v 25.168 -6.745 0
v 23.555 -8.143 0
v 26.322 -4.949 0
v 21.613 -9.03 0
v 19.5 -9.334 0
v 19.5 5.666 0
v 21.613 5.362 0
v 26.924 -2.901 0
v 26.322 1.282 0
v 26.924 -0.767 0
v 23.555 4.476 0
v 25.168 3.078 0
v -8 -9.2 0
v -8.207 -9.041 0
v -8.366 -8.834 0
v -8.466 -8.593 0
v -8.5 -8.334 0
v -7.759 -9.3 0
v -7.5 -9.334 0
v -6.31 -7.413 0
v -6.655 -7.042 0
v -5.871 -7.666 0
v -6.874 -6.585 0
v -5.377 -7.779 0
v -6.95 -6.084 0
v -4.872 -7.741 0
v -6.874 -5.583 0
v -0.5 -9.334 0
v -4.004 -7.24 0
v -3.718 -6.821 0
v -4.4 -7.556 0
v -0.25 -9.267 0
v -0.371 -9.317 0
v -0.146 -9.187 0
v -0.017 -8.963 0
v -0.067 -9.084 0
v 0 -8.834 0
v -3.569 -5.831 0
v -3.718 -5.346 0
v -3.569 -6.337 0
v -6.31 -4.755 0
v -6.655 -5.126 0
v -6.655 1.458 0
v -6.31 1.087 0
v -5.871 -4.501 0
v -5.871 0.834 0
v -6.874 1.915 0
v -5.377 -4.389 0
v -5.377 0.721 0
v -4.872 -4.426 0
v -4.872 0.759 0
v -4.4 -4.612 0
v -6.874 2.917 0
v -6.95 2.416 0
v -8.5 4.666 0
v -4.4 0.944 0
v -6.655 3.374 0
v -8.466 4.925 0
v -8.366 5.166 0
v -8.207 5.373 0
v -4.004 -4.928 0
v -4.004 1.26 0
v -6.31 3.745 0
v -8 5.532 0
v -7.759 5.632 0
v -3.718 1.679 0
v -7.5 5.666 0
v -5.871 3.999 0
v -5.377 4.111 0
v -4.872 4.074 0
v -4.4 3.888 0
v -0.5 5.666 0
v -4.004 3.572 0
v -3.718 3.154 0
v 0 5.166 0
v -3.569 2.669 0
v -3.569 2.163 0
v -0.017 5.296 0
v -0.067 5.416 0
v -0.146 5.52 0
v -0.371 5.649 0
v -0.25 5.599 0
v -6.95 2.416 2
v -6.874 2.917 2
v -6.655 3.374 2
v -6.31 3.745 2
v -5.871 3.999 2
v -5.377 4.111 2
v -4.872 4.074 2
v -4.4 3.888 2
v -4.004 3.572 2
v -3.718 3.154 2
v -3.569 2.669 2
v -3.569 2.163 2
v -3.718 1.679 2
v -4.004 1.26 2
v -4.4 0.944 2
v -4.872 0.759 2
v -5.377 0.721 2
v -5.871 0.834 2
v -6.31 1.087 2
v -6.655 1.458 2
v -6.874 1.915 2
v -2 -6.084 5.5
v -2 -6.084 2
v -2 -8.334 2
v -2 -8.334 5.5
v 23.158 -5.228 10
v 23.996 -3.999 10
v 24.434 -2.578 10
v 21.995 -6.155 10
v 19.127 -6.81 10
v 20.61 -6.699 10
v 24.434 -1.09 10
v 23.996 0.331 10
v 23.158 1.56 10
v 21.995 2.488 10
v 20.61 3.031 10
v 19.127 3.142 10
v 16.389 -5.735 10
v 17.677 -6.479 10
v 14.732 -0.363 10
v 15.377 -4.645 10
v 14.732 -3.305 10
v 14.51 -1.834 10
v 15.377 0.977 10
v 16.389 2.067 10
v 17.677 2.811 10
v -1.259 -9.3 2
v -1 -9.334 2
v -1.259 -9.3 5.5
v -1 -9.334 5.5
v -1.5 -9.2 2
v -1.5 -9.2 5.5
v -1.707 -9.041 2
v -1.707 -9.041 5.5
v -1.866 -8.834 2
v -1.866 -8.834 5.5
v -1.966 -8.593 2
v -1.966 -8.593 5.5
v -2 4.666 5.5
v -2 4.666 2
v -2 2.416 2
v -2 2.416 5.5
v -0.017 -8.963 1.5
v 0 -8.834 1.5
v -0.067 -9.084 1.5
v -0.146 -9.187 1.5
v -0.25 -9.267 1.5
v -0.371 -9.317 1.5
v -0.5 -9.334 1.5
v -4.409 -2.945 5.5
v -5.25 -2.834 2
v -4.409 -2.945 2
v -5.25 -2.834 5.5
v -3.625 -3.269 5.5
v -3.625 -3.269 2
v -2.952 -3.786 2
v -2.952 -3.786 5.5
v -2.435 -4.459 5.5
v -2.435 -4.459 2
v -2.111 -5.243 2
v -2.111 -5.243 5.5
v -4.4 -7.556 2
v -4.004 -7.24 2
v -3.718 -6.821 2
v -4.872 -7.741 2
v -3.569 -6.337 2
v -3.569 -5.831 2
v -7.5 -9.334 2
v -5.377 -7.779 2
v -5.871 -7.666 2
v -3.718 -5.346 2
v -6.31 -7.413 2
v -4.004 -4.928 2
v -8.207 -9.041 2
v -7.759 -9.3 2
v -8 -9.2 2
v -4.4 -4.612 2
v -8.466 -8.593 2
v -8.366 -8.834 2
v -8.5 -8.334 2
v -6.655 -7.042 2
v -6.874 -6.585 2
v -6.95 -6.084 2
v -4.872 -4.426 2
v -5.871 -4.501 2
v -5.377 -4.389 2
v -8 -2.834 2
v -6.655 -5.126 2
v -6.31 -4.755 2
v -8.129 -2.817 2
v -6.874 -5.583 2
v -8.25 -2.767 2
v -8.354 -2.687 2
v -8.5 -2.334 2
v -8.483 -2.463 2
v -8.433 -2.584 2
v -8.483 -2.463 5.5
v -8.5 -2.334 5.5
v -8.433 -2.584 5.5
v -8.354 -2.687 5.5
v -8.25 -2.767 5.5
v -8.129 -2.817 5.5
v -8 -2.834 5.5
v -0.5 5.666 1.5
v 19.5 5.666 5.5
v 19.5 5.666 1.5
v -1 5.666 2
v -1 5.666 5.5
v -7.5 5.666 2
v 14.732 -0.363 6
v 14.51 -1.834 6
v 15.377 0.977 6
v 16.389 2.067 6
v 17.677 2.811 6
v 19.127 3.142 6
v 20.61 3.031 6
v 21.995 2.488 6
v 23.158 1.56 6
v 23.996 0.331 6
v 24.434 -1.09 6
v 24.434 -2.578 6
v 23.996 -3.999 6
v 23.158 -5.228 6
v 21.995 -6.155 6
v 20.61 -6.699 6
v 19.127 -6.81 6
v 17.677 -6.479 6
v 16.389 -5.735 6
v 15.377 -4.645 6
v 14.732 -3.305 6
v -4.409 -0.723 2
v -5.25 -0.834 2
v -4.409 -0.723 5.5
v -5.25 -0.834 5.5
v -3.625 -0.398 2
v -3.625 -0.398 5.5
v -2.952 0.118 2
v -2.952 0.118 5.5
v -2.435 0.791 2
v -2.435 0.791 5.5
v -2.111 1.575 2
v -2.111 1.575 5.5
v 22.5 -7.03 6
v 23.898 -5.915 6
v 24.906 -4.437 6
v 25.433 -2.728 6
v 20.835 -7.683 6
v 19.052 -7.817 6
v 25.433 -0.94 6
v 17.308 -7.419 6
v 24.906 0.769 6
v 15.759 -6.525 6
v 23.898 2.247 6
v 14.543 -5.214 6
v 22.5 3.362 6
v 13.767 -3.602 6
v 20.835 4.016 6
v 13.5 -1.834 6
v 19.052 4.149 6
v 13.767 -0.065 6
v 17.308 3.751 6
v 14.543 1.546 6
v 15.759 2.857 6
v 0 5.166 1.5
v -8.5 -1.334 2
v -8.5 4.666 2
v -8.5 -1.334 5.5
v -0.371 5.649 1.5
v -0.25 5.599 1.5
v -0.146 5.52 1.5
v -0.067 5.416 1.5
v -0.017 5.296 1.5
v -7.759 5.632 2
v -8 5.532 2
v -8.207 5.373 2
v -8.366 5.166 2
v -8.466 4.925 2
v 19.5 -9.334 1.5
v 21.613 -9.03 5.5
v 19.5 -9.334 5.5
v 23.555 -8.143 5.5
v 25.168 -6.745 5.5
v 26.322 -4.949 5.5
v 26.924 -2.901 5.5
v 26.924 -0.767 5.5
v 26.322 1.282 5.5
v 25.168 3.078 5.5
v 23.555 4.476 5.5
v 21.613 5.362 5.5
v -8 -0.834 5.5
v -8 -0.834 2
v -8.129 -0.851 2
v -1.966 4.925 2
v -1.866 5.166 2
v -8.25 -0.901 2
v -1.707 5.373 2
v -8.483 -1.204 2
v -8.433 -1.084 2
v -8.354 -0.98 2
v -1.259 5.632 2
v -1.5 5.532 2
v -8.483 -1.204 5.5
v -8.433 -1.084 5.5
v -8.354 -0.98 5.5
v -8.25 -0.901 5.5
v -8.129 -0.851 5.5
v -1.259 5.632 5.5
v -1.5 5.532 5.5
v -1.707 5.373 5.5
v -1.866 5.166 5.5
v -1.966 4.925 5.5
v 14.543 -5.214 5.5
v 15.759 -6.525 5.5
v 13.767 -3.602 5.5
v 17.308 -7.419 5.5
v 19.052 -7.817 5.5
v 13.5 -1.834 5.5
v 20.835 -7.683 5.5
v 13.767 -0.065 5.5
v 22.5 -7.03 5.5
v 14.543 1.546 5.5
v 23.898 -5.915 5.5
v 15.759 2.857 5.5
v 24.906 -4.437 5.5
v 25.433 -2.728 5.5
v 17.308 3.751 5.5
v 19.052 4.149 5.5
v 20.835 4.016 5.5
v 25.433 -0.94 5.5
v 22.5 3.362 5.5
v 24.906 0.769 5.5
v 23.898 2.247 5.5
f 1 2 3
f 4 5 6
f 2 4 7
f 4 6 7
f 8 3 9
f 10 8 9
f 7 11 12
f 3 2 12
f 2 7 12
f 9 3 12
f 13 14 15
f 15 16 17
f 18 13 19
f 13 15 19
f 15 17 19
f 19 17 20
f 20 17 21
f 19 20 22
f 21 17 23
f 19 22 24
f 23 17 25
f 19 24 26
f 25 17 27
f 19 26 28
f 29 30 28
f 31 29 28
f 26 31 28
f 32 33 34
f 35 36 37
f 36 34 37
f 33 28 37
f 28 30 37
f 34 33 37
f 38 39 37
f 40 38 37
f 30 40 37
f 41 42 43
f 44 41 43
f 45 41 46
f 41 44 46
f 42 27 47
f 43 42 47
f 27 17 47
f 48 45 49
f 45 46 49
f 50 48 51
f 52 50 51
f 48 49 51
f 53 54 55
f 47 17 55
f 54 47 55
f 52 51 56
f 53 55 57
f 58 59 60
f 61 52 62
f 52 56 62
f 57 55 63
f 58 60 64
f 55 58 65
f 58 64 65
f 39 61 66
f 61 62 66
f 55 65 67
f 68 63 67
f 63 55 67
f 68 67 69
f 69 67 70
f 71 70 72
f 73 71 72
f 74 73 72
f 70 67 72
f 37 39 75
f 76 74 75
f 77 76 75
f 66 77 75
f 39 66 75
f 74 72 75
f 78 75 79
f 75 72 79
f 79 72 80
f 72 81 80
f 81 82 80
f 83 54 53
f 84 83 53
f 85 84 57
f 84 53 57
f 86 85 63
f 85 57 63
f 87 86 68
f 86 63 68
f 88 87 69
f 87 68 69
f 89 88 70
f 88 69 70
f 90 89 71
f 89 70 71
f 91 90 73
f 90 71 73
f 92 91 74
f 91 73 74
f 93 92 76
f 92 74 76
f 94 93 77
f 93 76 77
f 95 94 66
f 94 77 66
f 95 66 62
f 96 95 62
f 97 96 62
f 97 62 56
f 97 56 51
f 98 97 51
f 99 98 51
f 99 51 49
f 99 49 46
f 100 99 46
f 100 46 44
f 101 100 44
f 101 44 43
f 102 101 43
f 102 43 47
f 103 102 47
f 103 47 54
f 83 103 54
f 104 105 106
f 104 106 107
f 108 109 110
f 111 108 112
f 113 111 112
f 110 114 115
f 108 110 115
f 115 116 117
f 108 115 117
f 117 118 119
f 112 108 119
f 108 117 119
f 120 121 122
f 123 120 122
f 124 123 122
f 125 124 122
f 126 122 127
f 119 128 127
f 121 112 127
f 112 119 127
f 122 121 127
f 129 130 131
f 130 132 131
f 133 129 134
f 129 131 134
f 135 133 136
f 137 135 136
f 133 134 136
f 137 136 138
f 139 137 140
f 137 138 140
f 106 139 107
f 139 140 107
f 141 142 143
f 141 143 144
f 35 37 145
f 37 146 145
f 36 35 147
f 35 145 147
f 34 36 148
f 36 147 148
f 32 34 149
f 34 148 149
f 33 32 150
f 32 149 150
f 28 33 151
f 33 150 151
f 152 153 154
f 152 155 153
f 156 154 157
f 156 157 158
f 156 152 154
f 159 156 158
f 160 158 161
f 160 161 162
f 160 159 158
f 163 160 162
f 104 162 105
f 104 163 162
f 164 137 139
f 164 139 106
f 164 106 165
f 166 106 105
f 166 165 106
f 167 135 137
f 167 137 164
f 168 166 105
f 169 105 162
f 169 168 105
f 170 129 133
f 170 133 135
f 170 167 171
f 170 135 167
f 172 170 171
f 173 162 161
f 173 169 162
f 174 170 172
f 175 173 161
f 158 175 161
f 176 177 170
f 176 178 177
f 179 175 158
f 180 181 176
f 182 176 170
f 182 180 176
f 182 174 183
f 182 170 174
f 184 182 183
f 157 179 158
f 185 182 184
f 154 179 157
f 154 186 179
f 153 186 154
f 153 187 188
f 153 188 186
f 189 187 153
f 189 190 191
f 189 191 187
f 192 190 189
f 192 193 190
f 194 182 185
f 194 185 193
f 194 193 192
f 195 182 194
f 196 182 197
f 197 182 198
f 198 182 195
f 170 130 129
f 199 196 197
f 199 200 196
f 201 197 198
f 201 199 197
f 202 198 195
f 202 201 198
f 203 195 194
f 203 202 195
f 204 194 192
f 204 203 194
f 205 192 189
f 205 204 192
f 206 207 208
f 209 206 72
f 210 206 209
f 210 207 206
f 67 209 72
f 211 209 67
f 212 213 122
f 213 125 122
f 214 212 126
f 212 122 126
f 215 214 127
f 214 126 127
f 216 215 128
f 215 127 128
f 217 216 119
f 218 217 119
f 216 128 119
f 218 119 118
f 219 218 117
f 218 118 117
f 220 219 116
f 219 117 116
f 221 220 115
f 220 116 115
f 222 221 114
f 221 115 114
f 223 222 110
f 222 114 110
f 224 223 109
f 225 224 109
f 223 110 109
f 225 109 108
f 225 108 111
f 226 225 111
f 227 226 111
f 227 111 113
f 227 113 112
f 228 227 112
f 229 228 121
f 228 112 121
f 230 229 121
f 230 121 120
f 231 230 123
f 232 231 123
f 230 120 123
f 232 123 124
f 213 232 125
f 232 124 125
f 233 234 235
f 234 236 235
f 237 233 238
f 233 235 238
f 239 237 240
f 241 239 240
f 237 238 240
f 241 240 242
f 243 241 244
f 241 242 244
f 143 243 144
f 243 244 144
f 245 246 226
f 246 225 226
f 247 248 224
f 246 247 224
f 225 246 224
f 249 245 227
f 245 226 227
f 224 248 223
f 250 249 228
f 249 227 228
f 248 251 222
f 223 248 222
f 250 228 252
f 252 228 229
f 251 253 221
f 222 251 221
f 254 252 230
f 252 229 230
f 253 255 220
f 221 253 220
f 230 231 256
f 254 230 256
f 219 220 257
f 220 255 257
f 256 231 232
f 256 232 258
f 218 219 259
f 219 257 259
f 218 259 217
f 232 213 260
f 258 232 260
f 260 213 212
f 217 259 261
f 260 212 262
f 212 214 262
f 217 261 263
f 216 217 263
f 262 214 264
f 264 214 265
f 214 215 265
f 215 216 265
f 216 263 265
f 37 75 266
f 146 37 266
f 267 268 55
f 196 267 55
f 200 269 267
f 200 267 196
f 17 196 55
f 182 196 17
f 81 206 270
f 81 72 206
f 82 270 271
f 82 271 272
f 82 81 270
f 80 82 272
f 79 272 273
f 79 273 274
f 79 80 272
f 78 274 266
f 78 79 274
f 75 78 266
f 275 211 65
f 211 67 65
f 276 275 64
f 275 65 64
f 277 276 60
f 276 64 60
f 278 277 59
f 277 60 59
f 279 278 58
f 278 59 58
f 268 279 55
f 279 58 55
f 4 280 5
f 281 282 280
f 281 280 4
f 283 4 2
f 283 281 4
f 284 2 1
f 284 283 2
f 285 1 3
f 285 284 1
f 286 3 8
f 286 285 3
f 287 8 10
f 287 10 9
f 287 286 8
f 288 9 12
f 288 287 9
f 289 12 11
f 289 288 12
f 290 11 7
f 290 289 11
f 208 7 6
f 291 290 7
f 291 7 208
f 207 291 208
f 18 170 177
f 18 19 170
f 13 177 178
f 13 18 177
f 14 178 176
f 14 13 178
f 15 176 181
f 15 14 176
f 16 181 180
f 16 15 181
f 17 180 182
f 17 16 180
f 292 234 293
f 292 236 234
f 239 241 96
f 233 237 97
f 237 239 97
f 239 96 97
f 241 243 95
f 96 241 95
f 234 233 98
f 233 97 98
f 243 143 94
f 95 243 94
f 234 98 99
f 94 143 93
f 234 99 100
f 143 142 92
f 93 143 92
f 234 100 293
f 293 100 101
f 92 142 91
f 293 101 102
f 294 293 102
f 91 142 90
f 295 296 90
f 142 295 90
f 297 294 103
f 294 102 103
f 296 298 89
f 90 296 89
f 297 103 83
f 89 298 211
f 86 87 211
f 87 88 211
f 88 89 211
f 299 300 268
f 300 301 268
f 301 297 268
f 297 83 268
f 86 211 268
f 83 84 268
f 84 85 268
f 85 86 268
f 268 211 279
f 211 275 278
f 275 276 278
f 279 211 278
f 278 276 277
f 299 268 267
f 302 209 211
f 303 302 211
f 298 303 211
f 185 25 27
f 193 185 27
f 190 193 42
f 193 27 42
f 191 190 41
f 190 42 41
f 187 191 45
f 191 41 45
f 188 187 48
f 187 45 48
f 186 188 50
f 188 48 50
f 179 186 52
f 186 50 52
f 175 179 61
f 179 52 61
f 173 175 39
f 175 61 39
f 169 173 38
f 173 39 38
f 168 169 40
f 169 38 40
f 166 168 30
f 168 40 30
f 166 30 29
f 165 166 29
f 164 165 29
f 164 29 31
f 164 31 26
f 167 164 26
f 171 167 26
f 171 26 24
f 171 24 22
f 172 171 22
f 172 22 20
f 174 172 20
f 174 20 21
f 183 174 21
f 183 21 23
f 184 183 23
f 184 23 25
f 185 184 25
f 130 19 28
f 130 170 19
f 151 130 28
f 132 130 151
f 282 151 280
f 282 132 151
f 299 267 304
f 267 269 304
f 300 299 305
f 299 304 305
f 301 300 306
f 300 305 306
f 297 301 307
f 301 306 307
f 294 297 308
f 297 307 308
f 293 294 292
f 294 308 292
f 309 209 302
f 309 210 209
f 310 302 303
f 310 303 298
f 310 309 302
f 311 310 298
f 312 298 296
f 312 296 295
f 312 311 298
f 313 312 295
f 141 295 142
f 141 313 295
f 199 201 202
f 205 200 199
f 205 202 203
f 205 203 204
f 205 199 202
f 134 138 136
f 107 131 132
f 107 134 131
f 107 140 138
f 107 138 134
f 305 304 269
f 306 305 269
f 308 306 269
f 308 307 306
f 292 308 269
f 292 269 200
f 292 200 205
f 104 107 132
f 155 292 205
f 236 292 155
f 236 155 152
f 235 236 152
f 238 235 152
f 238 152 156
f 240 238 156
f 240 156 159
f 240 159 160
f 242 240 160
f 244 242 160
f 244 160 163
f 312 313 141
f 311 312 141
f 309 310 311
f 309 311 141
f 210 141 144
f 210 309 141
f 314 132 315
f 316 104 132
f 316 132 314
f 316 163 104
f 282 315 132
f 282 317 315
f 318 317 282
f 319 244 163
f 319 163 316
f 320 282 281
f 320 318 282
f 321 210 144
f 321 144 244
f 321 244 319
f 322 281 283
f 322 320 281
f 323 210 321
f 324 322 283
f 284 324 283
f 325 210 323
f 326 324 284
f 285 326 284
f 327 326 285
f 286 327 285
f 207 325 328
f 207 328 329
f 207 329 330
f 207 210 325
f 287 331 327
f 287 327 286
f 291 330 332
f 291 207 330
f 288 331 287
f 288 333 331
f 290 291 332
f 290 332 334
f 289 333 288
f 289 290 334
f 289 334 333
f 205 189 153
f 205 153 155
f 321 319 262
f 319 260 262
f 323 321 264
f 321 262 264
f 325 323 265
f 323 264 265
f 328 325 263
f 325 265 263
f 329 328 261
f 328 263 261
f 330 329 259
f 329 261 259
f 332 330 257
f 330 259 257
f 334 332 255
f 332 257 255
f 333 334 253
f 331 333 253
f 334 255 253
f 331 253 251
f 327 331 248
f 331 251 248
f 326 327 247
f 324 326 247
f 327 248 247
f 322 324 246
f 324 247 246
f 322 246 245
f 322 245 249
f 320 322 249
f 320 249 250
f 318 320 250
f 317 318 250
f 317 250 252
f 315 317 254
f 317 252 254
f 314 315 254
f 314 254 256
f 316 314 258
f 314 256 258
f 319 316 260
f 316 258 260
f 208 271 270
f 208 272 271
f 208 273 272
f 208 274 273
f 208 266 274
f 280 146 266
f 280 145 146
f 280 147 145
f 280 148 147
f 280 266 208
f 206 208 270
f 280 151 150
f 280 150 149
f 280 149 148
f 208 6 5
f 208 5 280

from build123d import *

# Parameters (mm, degrees)
EXTRUDE_1_DEPTH         = 5.5
SKETCH_2_W              = 19.5
SKETCH_2_H              = 1.5
CUT_EXTRUDE_1_DEPTH     = 32.372758884
SKETCH_3_W              = 6.5
SKETCH_3_H              = 3.5
CUT_EXTRUDE_2_DEPTH     = 6.5
SKETCH_4_W              = 3.5
SKETCH_4_H              = 6.5
CUT_EXTRUDE_3_DEPTH     = 6.5
HOLE_WIZARD_3_4_3_4_1_D = 3.4
FILLET_1_R              = 0.5
FILLET_2_R              = 1
FILLET_3_R              = 3.25


with BuildPart() as part:
    # 草图1 → 凸台-拉伸1 (new body)
    with BuildSketch(Plane.XY.offset(5.5)):
        with BuildLine():
            Line((19.5, 5.666127278), (-8.5, 5.666127278))
            Line((-8.5, 5.666127278), (-8.5, -9.333872722))
            Line((-8.5, -9.333872722), (19.5, -9.333872722))
            ThreePointArc((19.5, -9.333872722), (27, -1.833872722), (19.5, 5.666127278))
        make_face()
    extrude(amount=-EXTRUDE_1_DEPTH)

    # 草图2 → 切除-拉伸1 (cut, through all)
    with BuildSketch(Plane.XZ.offset(9.333872722)):
        with Locations((9.75, 0.75)):
            Rectangle(SKETCH_2_W, SKETCH_2_H)
    extrude(amount=-CUT_EXTRUDE_1_DEPTH, mode=Mode.SUBTRACT)

    # 草图3 → 切除-拉伸2 (cut)
    with BuildSketch(Plane(origin=(0, 5.666127278, 0), x_dir=(-1, 0, 0), z_dir=(0, 1, 0))):
        with Locations((5.25, 3.75)):
            Rectangle(SKETCH_3_W, SKETCH_3_H)
    extrude(amount=-CUT_EXTRUDE_2_DEPTH, mode=Mode.SUBTRACT)

    # 草图4 → 切除-拉伸3 (cut)
    with BuildSketch(Plane.ZY.offset(8.5)):
        with Locations((3.75, -6.083872722)):
            Rectangle(SKETCH_4_W, SKETCH_4_H)
    extrude(amount=-CUT_EXTRUDE_3_DEPTH, mode=Mode.SUBTRACT)

    # 草图5 → 旋转1 (revolve)
    with BuildSketch(Plane.XZ.offset(1.833872722), mode=Mode.PRIVATE) as revolve_1_sk:
        Polygon((24.49, 10), (19.5, 10), (19.5, 5.5), (25.5, 5.5), (25.5, 6), (24.49, 6), align=None)
    revolve(revolve_1_sk.sketch.rotate(Axis((19.5, -1.833872722, 10), (0, 0, -1)), 180), axis=Axis((19.5, -1.833872722, 10), (0, 0, -1)))

    # Ø3.4 (3.4) 直径孔1 (through all)
    with Locations(Plane.XY.offset(2)):
        with Locations((-5.25, 2.416127278), (-5.25, -6.083872722)):
            Hole(HOLE_WIZARD_3_4_3_4_1_D / 2)

    # 圆角1
    fillet_1_edges = [part.edges().sort_by_distance(p)[0] for p in [
        (0, 5.666127278, 0.75),
        (0, -9.333872722, 0.75),
        (-8.5, -0.833872722, 3.75),
        (-8.5, -2.833872722, 3.75),
    ]]
    fillet(fillet_1_edges, radius=FILLET_1_R)

    # 圆角2
    fillet_2_edges = [part.edges().sort_by_distance(p)[0] for p in [
        (-2, 5.666127278, 3.75),
        (-2, -9.333872722, 3.75),
        (-8.5, -9.333872722, 1),
        (-8.5, 5.666127278, 1),
    ]]
    fillet(fillet_2_edges, radius=FILLET_2_R)

    # 圆角3
    fillet_3_edges = [part.edges().sort_by_distance(p)[0] for p in [
        (-2, -0.833872722, 3.75),
        (-2, -2.833872722, 3.75),
    ]]
    fillet(fillet_3_edges, radius=FILLET_3_R)


solid = part.part
